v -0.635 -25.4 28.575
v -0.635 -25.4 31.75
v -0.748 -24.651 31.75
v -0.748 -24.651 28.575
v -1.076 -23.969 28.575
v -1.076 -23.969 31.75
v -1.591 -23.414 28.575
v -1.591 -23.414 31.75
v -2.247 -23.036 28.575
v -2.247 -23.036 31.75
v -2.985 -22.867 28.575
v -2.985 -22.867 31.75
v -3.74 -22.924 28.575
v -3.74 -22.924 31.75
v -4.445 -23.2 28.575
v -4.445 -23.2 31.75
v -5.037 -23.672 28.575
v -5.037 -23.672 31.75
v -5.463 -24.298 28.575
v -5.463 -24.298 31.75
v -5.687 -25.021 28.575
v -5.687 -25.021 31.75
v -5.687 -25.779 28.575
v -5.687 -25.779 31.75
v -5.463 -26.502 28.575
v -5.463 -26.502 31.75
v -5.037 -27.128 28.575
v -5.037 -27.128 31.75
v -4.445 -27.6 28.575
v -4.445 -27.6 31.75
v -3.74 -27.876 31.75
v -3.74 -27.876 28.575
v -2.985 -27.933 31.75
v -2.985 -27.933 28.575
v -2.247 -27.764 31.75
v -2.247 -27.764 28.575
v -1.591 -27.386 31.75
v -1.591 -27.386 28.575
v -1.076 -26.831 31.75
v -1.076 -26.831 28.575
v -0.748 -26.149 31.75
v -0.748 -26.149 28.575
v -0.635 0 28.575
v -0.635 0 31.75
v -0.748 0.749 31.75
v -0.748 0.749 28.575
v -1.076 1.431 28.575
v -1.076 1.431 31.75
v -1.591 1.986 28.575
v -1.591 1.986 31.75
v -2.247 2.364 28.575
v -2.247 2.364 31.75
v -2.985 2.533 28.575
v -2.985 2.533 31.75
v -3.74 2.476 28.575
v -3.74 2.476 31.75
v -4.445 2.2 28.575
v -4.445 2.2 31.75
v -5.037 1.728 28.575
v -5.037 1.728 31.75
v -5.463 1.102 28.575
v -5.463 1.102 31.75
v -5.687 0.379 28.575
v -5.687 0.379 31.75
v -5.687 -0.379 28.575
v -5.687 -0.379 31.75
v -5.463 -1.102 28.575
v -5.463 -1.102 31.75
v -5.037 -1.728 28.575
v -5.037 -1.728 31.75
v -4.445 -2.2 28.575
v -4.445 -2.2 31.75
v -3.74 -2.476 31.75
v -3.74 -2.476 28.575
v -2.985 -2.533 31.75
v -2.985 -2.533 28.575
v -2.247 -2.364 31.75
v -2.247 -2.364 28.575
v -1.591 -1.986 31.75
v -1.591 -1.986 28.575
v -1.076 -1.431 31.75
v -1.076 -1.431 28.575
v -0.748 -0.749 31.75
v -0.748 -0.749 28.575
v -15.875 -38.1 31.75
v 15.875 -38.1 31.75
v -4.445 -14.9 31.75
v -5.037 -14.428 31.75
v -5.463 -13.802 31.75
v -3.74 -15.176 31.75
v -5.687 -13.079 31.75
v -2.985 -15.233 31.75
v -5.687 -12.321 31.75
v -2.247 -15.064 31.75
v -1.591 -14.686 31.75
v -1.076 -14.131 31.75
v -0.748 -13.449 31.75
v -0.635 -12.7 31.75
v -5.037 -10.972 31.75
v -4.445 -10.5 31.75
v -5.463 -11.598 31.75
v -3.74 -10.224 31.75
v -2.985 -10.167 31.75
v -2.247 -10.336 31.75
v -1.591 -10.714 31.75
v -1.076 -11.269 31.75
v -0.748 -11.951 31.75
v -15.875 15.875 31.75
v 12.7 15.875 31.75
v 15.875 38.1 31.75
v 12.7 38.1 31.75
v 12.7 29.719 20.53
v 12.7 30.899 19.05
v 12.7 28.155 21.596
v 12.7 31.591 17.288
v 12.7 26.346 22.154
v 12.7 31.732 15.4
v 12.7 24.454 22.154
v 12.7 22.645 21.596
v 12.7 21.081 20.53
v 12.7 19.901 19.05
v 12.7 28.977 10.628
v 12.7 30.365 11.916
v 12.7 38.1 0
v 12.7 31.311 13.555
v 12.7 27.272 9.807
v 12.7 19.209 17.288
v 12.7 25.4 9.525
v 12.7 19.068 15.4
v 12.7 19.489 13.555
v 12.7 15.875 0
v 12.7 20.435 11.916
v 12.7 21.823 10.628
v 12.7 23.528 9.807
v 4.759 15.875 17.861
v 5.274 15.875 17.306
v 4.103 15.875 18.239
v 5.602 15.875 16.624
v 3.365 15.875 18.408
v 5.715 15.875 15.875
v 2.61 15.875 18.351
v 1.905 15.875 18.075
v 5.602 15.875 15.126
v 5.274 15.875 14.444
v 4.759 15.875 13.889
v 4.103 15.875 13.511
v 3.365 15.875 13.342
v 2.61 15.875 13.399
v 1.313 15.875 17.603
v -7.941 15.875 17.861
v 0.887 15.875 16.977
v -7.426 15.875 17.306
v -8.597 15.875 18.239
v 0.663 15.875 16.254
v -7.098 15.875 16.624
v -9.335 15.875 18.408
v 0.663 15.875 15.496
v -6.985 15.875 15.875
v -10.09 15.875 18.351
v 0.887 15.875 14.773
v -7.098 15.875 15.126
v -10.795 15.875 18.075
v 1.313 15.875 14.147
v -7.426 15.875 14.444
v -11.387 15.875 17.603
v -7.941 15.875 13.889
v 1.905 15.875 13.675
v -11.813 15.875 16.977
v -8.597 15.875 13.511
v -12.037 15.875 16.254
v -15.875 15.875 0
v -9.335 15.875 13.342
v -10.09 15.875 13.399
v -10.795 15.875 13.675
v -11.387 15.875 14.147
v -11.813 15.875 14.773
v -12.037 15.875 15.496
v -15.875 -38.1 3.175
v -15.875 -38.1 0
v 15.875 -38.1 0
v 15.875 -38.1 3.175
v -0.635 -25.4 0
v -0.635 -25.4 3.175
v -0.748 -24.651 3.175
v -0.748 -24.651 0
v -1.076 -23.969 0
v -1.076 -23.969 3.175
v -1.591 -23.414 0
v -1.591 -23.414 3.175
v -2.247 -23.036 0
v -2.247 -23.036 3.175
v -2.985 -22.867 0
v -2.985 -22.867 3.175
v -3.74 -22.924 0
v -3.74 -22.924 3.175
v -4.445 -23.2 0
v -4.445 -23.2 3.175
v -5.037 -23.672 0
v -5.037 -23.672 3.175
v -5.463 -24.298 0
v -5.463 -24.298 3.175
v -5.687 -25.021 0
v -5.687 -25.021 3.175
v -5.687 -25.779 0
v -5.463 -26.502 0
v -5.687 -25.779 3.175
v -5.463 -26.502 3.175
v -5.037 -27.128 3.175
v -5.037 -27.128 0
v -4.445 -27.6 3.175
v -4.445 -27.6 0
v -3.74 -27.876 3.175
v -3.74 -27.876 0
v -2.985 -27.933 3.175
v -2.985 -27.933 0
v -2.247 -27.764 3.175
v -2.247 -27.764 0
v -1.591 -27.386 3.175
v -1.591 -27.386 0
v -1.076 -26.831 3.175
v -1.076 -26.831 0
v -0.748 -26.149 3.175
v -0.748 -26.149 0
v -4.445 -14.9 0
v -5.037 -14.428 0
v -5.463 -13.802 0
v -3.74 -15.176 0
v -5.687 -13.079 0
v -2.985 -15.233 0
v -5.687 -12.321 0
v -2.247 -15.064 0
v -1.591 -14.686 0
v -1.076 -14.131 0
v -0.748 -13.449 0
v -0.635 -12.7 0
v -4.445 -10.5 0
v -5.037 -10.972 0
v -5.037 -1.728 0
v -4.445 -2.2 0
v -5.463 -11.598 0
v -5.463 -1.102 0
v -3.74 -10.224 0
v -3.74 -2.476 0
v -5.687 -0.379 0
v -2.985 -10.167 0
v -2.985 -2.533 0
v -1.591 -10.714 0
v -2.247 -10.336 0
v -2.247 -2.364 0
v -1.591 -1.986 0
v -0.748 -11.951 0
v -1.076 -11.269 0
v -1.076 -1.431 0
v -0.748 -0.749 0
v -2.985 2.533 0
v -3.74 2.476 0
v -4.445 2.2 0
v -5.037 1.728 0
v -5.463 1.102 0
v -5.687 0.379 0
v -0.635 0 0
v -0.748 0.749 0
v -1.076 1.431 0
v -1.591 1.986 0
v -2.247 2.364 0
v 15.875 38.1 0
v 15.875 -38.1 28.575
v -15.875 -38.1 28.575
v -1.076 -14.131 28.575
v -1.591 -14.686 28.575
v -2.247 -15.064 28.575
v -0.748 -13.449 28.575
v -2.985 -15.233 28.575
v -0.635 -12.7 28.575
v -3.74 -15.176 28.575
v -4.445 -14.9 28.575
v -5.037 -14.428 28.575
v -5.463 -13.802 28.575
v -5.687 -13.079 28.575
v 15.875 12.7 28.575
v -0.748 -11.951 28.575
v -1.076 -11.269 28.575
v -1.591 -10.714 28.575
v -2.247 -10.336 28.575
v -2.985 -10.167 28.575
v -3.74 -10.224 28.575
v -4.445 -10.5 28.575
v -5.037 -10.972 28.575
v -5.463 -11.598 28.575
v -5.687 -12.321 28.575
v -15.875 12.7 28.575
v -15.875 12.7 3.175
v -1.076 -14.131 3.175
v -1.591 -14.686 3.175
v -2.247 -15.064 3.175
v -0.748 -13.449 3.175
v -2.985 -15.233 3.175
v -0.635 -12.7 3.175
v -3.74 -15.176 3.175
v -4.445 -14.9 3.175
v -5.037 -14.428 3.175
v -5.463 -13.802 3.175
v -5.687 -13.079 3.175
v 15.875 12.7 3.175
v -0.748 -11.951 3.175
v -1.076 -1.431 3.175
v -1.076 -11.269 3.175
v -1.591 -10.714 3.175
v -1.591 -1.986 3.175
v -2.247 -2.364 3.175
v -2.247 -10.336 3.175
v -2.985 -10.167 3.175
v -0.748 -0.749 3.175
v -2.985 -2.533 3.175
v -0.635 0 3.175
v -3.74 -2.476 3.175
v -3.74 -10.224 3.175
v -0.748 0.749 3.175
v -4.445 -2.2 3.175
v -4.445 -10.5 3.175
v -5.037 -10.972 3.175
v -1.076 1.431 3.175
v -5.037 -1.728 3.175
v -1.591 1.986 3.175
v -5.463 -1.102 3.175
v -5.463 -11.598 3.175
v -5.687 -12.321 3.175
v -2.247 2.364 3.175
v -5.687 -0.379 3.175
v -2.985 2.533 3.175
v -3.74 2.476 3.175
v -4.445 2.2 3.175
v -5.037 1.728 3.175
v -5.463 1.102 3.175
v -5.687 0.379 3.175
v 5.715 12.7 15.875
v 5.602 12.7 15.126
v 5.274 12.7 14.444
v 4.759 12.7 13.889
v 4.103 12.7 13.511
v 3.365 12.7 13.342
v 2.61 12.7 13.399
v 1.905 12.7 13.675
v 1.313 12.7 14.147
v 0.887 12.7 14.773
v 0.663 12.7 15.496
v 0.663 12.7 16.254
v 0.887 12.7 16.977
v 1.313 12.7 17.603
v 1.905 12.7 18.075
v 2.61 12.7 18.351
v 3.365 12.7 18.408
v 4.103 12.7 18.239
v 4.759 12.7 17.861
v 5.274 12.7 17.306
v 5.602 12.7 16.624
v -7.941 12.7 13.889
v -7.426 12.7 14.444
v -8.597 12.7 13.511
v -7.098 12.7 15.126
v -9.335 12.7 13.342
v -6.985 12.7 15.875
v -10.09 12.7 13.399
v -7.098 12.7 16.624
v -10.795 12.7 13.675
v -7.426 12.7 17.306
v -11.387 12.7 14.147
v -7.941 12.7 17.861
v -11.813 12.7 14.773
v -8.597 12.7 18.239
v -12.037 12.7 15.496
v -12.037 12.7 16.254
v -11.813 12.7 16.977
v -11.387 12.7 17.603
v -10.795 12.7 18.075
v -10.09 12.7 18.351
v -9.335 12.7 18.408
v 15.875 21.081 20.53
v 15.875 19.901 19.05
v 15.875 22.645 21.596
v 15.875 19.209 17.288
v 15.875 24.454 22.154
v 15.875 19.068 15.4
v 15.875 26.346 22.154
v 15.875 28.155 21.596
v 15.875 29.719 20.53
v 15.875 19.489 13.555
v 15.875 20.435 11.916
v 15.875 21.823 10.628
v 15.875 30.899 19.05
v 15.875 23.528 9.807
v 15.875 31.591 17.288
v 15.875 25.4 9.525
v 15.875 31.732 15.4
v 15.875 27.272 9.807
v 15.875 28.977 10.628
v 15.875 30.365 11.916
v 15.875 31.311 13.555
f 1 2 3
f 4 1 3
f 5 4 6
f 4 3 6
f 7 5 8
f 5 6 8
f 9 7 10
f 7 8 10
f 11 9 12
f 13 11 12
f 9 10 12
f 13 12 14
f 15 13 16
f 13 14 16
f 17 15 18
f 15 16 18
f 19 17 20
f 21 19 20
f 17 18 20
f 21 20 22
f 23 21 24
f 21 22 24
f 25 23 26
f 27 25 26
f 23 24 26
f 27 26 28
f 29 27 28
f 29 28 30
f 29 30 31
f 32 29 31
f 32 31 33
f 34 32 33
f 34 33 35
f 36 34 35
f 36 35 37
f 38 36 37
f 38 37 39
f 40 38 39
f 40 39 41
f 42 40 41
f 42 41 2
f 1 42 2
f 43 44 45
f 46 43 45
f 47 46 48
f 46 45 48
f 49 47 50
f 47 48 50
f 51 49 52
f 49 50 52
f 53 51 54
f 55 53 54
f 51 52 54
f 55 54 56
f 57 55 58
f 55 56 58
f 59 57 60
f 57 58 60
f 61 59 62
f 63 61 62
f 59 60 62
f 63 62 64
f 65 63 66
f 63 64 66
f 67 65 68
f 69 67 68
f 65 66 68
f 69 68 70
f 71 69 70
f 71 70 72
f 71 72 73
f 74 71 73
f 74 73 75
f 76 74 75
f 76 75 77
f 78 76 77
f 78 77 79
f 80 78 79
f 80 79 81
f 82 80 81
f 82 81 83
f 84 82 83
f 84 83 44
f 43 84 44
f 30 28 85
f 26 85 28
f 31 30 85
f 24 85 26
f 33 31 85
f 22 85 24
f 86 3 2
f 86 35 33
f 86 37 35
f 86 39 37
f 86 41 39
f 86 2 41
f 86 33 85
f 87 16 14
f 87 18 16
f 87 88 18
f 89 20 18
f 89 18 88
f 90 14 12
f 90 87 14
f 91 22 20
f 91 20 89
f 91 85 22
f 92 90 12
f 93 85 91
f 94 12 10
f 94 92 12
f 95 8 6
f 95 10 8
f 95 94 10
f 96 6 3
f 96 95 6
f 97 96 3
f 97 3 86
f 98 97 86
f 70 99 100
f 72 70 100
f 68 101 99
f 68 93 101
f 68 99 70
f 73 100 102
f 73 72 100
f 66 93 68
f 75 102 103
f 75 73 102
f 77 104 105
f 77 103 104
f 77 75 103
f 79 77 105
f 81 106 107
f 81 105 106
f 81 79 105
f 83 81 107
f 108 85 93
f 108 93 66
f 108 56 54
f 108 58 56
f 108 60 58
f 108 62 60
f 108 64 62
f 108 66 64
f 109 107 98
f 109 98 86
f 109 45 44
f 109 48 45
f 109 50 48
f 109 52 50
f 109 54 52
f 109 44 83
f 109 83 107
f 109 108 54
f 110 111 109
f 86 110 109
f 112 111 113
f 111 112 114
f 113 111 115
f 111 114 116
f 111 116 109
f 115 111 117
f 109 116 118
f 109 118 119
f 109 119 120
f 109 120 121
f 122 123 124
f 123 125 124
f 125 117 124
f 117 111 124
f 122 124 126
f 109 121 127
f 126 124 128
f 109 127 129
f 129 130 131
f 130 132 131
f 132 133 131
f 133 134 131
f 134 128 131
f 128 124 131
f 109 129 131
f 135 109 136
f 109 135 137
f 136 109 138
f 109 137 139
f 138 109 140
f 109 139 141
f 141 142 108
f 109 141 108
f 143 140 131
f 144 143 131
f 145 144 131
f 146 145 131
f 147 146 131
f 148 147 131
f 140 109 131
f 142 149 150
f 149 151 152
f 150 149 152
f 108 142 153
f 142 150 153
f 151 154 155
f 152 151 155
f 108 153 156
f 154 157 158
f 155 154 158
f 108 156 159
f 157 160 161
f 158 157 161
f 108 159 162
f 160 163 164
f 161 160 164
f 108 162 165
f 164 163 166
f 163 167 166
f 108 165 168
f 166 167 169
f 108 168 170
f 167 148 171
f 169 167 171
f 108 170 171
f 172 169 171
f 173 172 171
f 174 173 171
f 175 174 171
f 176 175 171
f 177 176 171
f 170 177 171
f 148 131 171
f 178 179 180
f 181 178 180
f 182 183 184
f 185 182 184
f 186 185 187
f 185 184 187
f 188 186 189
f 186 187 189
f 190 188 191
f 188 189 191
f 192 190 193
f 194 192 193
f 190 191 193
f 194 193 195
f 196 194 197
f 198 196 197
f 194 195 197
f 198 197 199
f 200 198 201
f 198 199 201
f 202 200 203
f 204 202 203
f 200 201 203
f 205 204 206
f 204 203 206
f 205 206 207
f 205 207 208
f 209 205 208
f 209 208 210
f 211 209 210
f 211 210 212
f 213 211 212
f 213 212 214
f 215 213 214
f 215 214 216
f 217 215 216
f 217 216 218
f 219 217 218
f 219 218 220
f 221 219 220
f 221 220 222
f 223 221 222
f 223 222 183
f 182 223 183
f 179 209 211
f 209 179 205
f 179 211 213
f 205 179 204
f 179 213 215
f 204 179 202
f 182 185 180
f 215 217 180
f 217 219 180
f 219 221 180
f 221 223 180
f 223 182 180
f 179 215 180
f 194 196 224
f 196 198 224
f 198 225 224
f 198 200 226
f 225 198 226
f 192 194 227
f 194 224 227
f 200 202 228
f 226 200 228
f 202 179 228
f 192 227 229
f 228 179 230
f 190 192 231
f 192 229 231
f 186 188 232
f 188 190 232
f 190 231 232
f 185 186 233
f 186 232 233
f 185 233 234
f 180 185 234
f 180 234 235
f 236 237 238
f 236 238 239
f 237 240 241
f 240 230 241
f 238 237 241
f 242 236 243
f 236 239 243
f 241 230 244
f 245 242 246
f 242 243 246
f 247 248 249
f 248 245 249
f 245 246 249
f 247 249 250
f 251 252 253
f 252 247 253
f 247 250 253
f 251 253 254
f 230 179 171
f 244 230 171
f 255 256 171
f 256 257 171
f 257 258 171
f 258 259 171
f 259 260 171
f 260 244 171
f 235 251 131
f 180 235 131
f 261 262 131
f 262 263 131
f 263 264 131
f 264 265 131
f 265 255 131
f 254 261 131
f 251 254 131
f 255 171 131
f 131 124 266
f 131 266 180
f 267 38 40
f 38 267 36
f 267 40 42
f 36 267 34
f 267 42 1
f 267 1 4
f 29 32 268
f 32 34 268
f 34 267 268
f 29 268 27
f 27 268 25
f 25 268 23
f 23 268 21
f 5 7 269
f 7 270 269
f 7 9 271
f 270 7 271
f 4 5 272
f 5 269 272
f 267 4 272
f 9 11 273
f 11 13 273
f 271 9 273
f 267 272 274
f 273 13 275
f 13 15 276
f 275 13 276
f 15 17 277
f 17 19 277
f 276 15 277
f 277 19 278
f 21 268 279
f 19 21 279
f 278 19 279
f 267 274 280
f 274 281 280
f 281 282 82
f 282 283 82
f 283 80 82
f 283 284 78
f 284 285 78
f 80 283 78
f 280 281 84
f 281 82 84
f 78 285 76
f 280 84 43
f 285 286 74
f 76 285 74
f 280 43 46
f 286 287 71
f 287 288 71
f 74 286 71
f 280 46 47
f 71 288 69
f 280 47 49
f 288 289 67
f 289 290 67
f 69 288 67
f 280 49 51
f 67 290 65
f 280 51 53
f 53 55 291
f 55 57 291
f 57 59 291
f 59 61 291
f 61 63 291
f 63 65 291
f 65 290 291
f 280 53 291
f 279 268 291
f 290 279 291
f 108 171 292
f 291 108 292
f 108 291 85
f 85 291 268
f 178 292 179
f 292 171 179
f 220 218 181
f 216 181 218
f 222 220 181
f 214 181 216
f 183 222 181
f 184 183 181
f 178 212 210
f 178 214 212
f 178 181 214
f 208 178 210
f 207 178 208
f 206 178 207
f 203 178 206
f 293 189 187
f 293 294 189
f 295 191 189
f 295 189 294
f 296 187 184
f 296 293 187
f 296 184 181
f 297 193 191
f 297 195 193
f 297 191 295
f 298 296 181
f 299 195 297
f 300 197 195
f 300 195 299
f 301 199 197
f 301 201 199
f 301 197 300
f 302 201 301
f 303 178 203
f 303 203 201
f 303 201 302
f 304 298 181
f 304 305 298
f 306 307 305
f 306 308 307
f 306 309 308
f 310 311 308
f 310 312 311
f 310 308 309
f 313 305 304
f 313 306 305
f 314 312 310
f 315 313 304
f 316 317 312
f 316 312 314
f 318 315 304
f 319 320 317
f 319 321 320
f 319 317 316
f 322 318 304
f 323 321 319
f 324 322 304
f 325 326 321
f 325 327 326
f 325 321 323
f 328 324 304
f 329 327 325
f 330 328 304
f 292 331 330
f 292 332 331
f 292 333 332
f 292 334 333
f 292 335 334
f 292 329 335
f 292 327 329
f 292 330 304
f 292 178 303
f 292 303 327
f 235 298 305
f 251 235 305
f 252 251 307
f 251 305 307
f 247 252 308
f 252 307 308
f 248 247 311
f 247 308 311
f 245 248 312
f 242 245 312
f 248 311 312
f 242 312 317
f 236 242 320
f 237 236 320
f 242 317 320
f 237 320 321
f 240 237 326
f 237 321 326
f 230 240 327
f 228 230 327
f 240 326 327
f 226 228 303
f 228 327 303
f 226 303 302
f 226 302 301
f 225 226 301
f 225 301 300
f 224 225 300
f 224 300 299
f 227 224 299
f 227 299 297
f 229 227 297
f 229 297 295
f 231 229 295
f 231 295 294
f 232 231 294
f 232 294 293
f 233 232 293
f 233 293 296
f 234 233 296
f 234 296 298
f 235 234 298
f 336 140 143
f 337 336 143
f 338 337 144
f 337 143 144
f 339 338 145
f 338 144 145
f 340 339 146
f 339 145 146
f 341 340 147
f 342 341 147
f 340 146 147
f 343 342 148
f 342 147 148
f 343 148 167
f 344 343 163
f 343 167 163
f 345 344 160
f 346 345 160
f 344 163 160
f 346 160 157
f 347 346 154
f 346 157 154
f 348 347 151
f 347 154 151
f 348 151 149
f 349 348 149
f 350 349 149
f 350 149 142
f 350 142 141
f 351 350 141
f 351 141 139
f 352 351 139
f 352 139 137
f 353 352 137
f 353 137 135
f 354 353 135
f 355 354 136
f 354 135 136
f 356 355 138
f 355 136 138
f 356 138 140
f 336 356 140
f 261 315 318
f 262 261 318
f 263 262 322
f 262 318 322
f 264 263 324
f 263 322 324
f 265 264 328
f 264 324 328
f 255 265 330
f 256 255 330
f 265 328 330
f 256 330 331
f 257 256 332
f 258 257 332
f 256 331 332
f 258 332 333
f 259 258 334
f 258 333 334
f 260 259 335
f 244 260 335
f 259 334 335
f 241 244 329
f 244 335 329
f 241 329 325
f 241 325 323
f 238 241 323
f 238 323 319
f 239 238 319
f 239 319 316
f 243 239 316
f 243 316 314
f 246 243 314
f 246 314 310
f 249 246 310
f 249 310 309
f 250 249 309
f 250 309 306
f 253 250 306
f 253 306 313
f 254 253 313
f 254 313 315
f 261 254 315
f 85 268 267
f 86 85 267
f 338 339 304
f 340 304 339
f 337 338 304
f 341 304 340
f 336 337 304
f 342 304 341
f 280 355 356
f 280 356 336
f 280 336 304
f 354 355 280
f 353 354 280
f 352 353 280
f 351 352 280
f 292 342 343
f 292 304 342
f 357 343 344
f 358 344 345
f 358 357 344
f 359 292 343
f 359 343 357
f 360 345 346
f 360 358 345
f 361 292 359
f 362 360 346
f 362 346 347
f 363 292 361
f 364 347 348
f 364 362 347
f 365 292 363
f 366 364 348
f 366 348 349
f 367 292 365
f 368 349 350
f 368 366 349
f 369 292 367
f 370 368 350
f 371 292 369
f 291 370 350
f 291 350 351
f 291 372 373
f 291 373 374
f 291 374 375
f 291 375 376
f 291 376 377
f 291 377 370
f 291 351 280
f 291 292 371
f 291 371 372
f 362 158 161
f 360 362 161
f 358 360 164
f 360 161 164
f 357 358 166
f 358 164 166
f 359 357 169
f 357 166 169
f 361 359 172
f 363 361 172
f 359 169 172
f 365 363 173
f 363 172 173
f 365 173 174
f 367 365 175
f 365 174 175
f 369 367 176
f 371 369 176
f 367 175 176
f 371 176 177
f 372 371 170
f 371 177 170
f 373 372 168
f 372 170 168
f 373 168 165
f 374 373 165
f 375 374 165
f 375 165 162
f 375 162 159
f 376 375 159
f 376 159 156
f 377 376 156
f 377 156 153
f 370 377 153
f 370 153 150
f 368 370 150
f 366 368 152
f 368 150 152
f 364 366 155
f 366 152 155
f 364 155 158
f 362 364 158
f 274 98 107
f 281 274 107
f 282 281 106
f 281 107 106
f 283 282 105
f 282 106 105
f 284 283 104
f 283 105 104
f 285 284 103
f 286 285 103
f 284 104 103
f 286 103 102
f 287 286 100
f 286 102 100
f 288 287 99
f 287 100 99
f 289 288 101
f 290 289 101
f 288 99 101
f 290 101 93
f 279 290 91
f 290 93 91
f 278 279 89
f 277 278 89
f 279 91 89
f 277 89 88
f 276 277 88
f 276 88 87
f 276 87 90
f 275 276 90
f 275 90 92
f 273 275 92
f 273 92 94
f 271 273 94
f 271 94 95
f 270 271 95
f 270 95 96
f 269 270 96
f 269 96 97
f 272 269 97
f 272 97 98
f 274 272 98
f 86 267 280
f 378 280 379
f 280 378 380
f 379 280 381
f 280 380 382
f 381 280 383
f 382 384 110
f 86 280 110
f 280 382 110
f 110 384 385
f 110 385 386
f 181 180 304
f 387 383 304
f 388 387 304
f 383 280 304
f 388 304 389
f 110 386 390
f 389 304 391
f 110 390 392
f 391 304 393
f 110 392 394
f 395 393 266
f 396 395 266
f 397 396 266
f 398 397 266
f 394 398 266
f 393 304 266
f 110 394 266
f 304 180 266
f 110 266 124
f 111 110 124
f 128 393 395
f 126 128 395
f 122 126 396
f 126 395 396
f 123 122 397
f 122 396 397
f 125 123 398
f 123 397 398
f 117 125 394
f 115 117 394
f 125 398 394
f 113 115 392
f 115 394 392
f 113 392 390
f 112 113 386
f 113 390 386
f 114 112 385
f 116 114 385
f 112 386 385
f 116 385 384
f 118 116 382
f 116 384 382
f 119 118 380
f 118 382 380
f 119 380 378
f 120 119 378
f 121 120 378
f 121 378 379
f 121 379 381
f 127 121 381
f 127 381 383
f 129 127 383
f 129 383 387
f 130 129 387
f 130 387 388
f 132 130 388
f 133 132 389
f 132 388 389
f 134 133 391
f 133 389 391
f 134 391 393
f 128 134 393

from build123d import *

# Parameters (mm, degrees)
BOSS_EXTRUDE2_DEPTH = 31.75
SKETCH10_W          = 25.4
SKETCH10_H          = 50.8
CUT_EXTRUDE4_DEPTH  = 32.75
SKETCH11_R          = 2.54
CUT_EXTRUDE5_DEPTH  = 3.175
SKETCH12_R          = 2.54
CUT_EXTRUDE6_DEPTH  = 31.75
SKETCH13_R          = 6.35
CUT_EXTRUDE7_DEPTH  = 3.175


with BuildPart() as part:
    # Sketch8 → Boss-Extrude2 (new body)
    with BuildSketch(Plane.XY):
        Polygon((-15.875, 15.875), (-15.875, -38.1), (15.875, -38.1), (15.875, 38.1), (12.7, 38.1), (12.7, 15.875), align=None)
    extrude(amount=BOSS_EXTRUDE2_DEPTH)

    # Sketch10 → Cut-Extrude4 (cut, through all)
    with BuildSketch(Plane.ZY.offset(15.875)):
        with Locations((15.875, -12.7)):
            Rectangle(SKETCH10_W, SKETCH10_H)
    extrude(amount=-CUT_EXTRUDE4_DEPTH, mode=Mode.SUBTRACT)

    # Sketch11 → Cut-Extrude5 (cut)
    with BuildSketch(Plane(origin=(0, 15.875, 0), x_dir=(1, 0, 0), z_dir=(0, 1, 0))):
        with Locations((-9.525, -15.875)):
            Circle(SKETCH11_R)
        with Locations((3.175, -15.875)):
            Circle(SKETCH11_R)
    extrude(amount=-CUT_EXTRUDE5_DEPTH, mode=Mode.SUBTRACT)

    # Sketch12 → Cut-Extrude6 (cut)
    with BuildSketch(Plane.XY.offset(31.75)):
        with Locations((-3.175, 0)):
            Circle(SKETCH12_R)
        with Locations((-3.175, -12.7)):
            Circle(SKETCH12_R)
        with Locations((-3.175, -25.4)):
            Circle(SKETCH12_R)
    extrude(amount=-CUT_EXTRUDE6_DEPTH, mode=Mode.SUBTRACT)

    # Sketch13 → Cut-Extrude7 (cut)
    with BuildSketch(Plane(origin=(15.875, 0, 0), x_dir=(0, 0, -1), z_dir=(1, 0, 0))):
        with Locations((-15.875, 25.4)):
            Circle(SKETCH13_R)
    extrude(amount=-CUT_EXTRUDE7_DEPTH, mode=Mode.SUBTRACT)


solid = part.part
